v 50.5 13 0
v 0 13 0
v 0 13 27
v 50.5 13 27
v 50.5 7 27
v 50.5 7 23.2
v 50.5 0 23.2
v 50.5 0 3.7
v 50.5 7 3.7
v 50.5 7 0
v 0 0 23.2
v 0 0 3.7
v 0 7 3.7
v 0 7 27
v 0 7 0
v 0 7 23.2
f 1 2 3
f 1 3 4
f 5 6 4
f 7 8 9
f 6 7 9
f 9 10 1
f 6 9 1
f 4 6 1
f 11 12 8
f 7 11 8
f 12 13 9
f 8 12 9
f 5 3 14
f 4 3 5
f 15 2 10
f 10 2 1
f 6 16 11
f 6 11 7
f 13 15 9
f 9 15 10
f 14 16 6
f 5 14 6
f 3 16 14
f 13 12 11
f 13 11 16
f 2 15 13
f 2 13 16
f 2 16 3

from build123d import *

# Parameters (mm, degrees)
BOX002002_W     = 50.5
BOX002002_H     = 7
BOX002002_DEPTH = 19.5
BOX002003_W     = 50.5
BOX002003_H     = 6
BOX002003_DEPTH = 27


with BuildPart() as f_7segment:
    # Box002002 → Box002002 (new body)
    with BuildSketch(Plane.XY.offset(3.7)):
        with Locations((25.25, 3.5)):
            Rectangle(BOX002002_W, BOX002002_H)
    extrude(amount=BOX002002_DEPTH)


with BuildPart() as f_7segmentbackpack:
    # Box002003 → Box002003 (new body)
    with BuildSketch(Plane(origin=(0, 7, 0), x_dir=(1, 0, 0), z_dir=(0, 0, 1))):
        with Locations((25.25, 3)):
            Rectangle(BOX002003_W, BOX002003_H)
    extrude(amount=BOX002003_DEPTH)

    # Fusion: union 7Segment
    add(f_7segment.part)


solid = f_7segmentbackpack.part
